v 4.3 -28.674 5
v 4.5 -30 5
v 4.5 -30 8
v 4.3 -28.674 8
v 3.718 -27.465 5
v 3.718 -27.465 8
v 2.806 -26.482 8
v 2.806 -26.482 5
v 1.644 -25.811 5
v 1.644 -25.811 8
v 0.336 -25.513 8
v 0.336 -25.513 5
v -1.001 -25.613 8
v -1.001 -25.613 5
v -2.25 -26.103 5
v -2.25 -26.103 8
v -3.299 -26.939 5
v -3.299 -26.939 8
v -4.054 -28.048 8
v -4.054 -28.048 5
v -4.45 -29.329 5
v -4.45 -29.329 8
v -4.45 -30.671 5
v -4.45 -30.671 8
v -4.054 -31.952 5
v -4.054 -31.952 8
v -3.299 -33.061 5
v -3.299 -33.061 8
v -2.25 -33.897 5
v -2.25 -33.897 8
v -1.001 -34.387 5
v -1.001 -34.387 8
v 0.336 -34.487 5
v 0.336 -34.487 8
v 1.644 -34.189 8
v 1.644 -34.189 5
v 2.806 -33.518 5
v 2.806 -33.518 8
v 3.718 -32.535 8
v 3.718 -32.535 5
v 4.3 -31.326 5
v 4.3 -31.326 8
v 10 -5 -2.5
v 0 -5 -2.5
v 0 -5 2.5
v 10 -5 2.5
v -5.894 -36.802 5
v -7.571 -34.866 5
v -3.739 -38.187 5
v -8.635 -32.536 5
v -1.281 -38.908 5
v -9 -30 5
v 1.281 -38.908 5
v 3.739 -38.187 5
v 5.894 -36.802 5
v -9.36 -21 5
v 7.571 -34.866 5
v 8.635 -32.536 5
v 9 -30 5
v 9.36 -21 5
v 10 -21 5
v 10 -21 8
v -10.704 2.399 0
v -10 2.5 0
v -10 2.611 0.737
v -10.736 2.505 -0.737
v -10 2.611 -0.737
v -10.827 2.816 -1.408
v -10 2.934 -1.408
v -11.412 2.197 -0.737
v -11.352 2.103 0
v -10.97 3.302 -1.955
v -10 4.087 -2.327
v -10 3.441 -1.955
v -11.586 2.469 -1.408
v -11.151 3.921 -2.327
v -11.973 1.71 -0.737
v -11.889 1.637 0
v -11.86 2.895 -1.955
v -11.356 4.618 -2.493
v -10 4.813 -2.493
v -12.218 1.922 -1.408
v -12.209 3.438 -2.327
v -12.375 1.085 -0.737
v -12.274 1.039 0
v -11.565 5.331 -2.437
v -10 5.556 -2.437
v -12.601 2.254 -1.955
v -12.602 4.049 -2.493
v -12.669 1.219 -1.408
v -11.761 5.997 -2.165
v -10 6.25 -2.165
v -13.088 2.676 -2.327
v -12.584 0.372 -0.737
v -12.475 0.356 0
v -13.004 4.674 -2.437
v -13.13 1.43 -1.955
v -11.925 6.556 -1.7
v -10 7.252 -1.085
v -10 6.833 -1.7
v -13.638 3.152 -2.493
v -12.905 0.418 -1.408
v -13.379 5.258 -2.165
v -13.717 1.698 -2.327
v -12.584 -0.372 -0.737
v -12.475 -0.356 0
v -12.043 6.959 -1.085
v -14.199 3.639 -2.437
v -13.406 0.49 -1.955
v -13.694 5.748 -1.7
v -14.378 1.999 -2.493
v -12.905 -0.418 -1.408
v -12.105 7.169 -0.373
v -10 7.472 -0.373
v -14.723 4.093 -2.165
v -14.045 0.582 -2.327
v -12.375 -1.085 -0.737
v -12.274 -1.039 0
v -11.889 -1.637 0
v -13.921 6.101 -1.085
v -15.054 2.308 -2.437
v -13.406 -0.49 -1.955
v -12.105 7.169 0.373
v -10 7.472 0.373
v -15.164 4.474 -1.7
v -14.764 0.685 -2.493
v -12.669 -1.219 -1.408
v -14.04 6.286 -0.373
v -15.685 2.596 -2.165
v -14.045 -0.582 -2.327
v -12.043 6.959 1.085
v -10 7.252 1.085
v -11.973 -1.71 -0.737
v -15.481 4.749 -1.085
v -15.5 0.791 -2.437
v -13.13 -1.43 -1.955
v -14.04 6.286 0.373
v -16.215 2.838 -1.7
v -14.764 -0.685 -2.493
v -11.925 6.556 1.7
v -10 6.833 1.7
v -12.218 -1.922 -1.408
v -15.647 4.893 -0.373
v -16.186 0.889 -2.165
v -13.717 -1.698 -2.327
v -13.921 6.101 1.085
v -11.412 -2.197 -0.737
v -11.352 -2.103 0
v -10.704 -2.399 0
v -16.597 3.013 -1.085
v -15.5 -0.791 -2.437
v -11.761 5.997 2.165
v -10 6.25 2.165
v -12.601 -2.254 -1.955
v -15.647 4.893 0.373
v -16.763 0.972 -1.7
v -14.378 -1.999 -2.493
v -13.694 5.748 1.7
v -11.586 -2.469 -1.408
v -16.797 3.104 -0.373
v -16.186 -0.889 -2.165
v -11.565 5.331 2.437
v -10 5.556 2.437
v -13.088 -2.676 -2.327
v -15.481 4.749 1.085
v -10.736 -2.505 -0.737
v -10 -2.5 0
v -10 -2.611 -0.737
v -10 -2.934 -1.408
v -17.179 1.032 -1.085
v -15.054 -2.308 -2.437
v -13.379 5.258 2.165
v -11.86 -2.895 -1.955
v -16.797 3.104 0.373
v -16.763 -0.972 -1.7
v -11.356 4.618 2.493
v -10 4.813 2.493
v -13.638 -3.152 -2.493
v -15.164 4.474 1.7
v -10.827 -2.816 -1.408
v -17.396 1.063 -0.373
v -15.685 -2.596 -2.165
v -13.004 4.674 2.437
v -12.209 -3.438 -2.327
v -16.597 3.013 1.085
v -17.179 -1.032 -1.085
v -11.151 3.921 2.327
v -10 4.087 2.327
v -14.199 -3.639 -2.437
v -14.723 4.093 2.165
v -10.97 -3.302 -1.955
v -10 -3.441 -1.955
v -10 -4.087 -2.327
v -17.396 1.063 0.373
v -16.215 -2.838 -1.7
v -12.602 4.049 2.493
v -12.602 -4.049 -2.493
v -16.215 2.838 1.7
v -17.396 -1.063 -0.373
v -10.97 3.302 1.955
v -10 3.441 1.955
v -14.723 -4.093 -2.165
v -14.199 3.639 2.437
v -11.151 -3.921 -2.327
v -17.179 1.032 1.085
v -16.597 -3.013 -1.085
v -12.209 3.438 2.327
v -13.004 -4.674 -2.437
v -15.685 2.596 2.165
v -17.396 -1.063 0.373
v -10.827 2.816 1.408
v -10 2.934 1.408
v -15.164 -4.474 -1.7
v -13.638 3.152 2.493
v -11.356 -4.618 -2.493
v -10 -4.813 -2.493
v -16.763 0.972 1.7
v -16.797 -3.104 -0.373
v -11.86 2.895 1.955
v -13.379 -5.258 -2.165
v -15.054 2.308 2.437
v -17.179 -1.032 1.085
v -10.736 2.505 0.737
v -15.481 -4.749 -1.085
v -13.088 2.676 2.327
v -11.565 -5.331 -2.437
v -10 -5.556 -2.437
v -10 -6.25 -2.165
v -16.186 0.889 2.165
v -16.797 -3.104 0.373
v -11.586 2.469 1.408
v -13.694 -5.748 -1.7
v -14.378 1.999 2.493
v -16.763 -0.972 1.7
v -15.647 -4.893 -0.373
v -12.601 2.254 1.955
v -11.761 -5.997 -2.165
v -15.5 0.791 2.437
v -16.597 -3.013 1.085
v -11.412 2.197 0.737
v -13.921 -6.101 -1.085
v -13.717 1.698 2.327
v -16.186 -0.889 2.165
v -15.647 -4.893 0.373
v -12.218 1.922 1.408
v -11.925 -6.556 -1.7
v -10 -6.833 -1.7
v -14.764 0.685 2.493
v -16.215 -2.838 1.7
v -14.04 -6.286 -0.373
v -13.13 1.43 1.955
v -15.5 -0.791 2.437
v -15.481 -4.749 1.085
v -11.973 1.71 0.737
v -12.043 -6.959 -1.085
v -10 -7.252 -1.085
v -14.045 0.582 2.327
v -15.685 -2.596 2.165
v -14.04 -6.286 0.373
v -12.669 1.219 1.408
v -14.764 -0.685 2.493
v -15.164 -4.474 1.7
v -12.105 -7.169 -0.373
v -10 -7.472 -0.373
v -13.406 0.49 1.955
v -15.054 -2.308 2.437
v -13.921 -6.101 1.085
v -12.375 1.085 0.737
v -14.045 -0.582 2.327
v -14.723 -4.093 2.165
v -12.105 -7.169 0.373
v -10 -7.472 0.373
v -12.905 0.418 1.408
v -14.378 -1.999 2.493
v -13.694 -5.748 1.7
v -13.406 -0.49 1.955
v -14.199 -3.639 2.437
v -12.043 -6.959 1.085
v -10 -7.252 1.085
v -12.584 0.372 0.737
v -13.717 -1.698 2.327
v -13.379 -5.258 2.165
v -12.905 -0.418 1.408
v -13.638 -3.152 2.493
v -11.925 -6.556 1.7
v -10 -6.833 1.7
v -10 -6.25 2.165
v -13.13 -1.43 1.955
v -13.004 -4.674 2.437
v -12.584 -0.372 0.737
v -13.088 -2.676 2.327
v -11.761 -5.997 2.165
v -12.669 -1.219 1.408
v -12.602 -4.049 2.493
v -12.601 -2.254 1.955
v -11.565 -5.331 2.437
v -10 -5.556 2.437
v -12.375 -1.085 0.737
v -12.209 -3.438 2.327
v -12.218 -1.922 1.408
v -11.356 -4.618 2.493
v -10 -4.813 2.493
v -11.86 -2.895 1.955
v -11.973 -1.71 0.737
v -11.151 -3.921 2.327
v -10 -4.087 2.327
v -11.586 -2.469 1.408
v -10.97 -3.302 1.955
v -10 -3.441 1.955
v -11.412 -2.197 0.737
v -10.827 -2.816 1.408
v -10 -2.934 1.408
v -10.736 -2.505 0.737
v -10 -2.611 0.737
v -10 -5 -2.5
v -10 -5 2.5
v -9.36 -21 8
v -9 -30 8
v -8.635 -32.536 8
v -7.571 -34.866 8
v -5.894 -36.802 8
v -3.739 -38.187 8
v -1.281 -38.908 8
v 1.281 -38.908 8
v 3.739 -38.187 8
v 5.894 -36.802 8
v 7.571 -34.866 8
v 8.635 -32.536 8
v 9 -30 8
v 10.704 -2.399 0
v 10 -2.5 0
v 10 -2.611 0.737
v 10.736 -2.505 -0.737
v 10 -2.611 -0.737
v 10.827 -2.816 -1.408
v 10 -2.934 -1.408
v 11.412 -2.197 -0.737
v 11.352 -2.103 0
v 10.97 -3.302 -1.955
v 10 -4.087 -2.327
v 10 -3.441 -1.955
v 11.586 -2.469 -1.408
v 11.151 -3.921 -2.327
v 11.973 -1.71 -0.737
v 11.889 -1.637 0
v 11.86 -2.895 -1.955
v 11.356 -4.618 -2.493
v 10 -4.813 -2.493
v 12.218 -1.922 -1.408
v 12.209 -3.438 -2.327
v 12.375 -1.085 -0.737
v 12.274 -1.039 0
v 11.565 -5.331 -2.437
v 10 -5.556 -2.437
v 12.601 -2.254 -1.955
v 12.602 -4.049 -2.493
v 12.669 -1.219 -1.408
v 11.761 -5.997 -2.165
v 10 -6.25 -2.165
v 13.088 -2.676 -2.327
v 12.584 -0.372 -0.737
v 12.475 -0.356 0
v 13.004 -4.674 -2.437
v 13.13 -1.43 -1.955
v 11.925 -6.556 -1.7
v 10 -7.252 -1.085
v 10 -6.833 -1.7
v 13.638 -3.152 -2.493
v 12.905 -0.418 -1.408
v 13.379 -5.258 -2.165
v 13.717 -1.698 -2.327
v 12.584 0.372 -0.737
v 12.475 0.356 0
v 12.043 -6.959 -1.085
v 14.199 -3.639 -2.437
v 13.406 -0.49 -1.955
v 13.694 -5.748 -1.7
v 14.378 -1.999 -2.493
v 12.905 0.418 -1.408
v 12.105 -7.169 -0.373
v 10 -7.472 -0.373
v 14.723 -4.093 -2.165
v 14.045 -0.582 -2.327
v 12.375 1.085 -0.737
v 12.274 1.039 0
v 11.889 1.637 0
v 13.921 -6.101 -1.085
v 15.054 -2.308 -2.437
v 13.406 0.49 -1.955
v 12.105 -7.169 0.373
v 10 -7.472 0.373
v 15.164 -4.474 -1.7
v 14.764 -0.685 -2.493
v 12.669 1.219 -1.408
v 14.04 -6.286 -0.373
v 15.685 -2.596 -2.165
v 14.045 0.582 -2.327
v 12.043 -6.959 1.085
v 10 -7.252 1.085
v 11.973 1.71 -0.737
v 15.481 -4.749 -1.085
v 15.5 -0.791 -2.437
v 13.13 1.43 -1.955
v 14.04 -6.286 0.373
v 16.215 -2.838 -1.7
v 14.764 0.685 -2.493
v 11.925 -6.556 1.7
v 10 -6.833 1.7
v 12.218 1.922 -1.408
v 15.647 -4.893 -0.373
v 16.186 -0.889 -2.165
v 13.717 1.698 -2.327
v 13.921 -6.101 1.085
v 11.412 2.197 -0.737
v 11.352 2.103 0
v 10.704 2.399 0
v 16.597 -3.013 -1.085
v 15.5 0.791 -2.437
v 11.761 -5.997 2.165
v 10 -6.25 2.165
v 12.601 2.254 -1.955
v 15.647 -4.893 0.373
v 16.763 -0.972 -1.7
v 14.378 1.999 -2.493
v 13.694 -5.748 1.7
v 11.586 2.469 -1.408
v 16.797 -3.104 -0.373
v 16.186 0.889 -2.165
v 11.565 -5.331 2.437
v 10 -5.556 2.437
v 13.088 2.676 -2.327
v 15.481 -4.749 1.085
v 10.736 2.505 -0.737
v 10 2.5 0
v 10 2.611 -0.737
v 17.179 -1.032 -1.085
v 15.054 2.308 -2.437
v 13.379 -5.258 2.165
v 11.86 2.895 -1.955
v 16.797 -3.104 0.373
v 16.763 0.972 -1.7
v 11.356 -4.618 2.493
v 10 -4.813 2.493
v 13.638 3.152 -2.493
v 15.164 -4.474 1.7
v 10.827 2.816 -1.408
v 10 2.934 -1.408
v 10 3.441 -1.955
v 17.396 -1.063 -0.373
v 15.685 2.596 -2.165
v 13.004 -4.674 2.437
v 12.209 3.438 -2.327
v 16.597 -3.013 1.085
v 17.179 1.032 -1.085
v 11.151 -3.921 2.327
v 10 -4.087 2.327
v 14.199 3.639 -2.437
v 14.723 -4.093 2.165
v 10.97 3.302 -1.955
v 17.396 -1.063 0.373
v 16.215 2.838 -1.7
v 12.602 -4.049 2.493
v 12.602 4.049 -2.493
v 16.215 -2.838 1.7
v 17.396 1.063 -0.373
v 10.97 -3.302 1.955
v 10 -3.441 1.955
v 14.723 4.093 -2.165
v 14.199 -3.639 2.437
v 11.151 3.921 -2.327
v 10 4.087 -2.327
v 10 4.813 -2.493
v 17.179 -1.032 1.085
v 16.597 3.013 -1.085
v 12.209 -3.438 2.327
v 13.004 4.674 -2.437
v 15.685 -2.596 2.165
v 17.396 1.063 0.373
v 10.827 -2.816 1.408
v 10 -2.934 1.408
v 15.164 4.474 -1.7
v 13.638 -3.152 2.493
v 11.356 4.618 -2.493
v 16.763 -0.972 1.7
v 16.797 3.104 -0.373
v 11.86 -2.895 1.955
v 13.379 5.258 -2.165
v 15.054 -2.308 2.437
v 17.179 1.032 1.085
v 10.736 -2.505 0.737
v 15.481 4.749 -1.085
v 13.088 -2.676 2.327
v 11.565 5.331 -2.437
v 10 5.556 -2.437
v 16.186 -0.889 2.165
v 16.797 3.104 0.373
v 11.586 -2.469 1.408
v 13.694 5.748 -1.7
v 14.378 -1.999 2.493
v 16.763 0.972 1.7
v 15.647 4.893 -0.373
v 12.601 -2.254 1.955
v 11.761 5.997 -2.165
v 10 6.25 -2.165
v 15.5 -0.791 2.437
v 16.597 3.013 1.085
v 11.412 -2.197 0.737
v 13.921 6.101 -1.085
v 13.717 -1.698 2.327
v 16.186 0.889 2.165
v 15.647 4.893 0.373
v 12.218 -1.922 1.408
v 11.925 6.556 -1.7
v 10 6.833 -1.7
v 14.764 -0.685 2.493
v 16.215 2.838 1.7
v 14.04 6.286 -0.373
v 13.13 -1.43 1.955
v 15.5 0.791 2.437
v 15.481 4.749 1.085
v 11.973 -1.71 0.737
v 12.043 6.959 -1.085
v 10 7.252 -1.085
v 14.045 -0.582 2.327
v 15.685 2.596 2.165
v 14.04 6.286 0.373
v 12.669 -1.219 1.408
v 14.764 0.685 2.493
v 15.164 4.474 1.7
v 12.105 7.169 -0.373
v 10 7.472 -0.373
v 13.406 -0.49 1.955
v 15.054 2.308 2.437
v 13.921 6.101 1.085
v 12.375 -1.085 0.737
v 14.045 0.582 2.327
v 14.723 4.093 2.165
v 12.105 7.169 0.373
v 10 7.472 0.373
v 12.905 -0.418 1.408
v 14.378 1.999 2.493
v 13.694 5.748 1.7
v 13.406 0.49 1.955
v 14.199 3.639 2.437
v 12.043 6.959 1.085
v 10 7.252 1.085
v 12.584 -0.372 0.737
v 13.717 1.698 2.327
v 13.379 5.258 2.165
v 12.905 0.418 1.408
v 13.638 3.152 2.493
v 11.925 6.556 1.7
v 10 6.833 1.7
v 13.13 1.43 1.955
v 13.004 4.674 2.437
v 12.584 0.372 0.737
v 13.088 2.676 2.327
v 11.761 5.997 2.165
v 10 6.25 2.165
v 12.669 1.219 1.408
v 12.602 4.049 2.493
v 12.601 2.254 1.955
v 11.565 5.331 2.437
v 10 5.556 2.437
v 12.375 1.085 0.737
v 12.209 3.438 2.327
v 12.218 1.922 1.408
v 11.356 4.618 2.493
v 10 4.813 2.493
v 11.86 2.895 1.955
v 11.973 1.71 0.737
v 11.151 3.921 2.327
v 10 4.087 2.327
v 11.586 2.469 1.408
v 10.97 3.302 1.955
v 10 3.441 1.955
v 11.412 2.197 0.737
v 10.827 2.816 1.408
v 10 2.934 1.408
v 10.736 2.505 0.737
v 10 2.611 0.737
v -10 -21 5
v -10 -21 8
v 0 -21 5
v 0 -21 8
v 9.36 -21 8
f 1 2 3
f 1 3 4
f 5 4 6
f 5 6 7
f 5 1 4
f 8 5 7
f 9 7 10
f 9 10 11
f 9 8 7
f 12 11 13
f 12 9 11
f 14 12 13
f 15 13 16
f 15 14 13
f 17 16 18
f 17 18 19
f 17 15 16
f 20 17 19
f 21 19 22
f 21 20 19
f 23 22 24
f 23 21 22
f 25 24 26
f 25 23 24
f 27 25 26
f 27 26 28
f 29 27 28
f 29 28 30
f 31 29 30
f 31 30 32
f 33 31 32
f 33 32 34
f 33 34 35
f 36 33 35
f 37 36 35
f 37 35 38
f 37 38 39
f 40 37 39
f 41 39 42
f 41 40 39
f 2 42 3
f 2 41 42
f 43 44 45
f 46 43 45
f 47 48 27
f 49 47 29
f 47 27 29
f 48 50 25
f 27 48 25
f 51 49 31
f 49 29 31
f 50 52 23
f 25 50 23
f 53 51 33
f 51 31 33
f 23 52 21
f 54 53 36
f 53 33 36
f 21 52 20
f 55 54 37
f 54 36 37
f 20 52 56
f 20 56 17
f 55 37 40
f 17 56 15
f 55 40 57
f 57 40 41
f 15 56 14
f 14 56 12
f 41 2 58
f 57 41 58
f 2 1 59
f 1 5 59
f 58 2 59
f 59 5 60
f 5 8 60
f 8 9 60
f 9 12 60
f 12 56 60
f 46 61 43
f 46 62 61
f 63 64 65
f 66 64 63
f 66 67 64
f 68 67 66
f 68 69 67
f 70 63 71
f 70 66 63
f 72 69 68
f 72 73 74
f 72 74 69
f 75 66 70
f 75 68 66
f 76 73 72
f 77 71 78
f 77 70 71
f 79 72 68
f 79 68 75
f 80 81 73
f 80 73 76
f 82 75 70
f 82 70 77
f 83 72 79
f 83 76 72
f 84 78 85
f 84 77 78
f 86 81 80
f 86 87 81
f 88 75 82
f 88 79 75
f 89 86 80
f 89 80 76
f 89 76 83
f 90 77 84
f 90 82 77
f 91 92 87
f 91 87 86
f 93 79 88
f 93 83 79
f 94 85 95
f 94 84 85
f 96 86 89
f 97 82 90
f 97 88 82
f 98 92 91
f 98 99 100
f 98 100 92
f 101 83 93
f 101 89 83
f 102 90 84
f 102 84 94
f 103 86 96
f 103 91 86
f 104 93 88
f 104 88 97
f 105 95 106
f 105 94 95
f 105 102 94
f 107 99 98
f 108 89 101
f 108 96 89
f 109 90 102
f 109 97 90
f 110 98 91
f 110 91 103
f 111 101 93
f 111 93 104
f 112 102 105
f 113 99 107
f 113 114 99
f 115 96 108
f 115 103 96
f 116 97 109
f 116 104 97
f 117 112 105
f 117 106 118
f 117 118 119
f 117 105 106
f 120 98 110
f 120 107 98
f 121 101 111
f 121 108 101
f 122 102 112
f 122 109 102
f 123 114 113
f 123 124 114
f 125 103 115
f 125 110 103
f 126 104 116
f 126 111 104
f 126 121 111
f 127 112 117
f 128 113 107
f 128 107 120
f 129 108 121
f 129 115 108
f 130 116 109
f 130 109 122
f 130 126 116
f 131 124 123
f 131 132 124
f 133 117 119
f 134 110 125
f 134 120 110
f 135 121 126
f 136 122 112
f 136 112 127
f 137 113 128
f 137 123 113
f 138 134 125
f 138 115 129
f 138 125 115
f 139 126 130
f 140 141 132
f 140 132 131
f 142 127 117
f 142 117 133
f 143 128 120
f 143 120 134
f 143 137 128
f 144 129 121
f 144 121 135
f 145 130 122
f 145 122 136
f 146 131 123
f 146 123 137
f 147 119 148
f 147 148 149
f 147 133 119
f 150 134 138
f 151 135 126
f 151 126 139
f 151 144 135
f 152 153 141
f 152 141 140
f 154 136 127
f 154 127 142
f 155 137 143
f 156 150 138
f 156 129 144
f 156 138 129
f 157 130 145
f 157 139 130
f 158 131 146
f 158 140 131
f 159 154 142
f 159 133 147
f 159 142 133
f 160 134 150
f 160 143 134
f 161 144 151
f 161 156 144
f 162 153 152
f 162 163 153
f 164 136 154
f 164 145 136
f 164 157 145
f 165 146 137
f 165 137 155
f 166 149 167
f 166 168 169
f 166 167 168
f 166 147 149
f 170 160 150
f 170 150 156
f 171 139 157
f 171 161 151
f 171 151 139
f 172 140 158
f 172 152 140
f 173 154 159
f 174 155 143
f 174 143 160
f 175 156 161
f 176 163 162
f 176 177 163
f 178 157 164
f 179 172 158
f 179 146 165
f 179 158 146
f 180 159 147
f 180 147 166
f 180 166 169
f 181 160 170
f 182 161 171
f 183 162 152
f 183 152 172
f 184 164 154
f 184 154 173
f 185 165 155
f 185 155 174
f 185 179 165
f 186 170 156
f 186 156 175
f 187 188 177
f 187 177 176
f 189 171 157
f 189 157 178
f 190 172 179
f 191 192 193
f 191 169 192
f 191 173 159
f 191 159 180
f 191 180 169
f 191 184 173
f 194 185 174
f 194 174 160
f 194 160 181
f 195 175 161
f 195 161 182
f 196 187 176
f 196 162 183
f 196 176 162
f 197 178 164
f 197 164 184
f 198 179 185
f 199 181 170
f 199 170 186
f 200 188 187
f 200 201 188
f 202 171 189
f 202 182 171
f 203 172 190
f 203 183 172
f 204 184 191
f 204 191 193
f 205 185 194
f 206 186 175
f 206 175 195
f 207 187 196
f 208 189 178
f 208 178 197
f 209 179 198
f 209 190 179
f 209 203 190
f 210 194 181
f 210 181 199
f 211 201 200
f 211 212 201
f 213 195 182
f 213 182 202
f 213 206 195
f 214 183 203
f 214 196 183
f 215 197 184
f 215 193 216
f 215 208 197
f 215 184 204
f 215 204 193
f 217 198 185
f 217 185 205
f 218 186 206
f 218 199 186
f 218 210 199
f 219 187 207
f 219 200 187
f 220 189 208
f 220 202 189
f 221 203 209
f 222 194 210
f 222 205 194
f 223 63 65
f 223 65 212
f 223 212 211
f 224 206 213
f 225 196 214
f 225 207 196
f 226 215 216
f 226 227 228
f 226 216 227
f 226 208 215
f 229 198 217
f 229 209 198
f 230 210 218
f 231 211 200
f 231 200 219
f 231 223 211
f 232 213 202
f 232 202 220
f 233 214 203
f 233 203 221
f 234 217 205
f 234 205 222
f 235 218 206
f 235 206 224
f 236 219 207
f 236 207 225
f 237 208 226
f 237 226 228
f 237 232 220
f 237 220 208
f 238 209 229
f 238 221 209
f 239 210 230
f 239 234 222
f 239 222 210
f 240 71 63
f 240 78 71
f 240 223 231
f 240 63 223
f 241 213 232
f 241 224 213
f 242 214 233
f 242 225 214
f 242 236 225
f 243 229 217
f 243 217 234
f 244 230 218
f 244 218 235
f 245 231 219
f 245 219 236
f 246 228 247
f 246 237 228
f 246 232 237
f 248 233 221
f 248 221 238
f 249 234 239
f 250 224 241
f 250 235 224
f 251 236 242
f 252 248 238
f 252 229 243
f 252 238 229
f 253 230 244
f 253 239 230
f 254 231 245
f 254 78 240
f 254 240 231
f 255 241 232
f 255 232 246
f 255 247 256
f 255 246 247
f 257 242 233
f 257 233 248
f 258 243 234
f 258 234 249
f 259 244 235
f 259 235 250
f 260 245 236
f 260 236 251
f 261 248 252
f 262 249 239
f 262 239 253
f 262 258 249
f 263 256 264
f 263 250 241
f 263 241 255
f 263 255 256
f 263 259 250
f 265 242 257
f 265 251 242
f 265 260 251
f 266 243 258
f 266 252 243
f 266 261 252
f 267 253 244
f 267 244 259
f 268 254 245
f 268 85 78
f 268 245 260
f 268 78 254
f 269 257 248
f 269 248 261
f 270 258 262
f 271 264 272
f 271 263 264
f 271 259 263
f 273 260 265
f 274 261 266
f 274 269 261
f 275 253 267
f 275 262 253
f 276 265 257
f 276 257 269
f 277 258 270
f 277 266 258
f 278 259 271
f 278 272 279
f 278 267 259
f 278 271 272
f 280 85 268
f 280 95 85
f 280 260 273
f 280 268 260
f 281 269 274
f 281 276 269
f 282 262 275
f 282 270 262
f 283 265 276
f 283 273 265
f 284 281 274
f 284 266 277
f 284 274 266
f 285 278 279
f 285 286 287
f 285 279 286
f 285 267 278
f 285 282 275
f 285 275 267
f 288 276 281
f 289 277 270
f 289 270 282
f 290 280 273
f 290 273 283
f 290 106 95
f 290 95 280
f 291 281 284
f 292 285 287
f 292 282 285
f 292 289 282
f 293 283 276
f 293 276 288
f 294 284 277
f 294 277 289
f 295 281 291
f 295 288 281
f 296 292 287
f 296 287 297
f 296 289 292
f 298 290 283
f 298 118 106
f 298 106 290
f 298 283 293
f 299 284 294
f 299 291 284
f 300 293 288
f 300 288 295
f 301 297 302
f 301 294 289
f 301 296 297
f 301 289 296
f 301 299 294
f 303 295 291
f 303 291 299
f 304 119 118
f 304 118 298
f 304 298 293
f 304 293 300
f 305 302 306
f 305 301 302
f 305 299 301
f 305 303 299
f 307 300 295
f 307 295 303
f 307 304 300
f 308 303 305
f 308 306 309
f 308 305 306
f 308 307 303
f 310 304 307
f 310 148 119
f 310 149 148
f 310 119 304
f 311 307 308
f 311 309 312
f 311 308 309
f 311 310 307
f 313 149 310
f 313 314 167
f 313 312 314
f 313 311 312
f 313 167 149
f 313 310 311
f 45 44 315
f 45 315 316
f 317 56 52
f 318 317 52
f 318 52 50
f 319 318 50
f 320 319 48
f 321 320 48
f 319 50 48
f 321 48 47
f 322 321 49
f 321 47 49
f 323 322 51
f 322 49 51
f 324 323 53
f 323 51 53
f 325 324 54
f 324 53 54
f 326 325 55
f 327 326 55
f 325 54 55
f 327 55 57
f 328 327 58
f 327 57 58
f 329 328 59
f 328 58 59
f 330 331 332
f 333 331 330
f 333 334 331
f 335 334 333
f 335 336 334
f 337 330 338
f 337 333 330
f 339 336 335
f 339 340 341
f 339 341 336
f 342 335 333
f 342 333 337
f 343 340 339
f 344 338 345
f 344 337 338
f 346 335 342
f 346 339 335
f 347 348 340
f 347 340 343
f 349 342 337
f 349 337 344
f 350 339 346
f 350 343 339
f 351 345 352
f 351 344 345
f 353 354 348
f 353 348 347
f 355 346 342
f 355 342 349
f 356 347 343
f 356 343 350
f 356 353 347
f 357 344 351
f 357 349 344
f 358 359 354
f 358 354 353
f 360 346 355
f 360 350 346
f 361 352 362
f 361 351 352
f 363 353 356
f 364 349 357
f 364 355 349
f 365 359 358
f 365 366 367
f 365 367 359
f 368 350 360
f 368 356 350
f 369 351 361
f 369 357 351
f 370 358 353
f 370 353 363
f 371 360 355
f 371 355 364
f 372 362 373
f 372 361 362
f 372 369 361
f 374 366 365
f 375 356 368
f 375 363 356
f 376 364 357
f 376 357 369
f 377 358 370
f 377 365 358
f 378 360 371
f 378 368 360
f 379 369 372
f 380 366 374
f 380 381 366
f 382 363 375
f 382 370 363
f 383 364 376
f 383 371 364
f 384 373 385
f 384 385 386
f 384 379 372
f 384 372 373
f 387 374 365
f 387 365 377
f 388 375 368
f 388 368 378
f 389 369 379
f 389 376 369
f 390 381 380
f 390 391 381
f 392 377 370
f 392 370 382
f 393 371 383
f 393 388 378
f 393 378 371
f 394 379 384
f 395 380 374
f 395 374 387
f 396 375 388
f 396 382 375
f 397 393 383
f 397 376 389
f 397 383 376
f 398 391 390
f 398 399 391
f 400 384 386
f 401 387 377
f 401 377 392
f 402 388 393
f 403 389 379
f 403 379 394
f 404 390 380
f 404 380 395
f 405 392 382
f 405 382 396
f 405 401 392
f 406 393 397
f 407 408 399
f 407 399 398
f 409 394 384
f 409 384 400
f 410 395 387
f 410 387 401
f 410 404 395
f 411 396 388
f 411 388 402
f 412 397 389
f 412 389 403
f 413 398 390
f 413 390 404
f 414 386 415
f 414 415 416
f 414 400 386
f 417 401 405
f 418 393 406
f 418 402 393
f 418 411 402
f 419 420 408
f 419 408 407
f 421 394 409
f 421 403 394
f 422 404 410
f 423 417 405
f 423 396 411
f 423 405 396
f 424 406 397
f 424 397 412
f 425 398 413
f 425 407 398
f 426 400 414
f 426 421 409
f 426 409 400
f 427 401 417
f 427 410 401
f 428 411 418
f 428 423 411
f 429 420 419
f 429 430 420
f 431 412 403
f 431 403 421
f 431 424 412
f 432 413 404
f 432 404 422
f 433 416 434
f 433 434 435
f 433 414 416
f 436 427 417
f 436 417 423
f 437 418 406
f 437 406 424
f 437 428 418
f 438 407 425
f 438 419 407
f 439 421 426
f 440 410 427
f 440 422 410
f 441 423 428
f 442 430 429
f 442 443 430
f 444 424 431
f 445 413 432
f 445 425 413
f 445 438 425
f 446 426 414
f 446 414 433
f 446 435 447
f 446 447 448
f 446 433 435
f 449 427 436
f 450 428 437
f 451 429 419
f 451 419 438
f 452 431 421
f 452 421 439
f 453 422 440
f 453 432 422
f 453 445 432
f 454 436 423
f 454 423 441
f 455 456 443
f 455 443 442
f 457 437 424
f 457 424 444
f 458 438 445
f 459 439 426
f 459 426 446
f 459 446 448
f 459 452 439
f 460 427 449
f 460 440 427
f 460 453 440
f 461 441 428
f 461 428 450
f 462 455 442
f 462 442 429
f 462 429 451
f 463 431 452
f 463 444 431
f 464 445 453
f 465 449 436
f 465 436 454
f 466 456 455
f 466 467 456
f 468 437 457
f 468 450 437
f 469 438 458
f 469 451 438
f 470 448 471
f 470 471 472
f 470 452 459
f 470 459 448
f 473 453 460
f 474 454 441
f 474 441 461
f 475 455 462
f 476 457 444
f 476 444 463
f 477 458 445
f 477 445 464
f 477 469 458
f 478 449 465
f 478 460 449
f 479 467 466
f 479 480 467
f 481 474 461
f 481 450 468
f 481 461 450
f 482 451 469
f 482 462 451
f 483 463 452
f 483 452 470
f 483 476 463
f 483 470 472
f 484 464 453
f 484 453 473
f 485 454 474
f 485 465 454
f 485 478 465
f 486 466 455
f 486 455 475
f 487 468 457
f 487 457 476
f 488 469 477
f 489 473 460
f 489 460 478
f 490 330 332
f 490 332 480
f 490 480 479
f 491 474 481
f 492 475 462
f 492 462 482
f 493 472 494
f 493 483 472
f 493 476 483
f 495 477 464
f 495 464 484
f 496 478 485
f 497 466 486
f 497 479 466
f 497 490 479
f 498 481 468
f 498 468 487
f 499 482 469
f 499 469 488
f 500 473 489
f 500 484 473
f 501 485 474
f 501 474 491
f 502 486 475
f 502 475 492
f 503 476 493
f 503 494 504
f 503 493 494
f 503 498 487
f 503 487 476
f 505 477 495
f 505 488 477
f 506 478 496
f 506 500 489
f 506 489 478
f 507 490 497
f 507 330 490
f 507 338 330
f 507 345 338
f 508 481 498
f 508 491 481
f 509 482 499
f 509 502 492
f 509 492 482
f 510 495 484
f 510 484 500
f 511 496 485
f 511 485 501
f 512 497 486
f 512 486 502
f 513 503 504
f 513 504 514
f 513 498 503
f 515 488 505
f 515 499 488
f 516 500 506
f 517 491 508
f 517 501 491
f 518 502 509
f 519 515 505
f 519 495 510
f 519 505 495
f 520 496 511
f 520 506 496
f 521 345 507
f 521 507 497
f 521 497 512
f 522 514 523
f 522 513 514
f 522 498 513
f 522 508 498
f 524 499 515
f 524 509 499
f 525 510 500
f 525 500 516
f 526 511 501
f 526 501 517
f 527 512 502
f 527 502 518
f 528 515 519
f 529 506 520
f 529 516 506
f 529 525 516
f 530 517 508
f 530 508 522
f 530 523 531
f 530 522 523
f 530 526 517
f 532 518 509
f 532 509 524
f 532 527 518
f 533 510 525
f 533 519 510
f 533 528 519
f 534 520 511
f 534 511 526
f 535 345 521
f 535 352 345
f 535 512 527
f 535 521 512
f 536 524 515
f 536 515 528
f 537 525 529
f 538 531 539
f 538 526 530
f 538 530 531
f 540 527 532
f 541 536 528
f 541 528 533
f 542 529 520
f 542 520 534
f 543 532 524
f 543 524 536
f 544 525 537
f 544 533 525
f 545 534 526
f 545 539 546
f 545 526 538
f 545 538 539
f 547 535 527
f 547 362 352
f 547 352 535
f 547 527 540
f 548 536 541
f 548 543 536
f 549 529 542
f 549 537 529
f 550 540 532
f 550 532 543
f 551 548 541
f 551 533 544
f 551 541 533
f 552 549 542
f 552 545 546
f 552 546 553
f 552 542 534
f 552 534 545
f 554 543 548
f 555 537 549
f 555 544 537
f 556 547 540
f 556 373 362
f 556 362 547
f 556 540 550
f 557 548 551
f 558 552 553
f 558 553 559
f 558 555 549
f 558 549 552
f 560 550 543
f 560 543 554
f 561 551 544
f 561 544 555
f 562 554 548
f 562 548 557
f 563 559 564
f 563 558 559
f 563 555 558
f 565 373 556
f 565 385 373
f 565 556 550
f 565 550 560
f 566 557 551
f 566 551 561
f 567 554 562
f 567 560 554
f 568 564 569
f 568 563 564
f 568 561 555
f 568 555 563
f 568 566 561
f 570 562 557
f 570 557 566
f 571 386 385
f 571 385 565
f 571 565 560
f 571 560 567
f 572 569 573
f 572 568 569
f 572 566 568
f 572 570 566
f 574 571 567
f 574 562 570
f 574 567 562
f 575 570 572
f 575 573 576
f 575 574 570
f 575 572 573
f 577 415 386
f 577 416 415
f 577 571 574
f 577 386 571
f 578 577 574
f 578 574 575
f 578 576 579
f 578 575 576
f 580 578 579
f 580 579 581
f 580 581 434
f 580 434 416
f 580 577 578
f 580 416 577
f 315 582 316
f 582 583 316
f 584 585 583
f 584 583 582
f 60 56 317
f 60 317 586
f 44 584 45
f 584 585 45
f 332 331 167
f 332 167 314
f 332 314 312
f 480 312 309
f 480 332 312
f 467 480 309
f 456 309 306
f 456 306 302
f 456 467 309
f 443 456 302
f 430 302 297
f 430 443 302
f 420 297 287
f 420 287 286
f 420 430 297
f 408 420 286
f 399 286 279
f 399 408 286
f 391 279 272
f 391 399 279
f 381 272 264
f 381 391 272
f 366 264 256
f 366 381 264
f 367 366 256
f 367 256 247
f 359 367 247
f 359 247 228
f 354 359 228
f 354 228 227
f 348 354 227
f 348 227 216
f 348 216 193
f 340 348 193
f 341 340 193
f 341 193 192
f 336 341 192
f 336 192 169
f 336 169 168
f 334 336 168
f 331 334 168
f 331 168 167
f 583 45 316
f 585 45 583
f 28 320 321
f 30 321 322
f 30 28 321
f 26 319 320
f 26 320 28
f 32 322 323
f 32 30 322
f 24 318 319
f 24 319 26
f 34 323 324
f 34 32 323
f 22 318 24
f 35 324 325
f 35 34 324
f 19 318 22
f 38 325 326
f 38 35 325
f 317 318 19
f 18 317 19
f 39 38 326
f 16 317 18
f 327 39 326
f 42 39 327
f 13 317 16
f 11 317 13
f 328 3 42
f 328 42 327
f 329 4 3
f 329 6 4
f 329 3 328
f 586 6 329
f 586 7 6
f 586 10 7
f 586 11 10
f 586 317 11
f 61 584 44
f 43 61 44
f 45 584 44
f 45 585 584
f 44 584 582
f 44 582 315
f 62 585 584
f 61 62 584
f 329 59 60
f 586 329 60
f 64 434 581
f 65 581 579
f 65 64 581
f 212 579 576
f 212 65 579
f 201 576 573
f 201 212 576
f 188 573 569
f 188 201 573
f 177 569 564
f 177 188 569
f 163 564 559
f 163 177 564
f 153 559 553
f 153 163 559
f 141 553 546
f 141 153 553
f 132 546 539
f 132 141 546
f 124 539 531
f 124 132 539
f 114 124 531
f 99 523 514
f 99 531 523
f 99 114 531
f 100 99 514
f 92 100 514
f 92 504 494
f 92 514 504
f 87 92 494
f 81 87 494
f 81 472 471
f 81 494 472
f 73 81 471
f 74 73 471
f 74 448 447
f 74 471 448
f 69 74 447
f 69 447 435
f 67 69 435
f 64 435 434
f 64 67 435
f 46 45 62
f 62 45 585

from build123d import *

# Parameters (mm, degrees)
F3_R      = 9
F3_R_2    = 4.5
F4_DEPTH  = 3
F6_DEPTH  = 3
F8_DEPTH  = 3.1
F10_DEPTH = 10
F11_DEPTH = 10
F1_R      = 2.5


with BuildPart() as f4:
    # F3 (on offset) → F4 (new body)
    with BuildSketch(Plane.XY.offset(5)):
        with Locations((0, -30)):
            Circle(F3_R)
        with Locations((0, -30)):
            Circle(F3_R_2, mode=Mode.SUBTRACT)
    extrude(amount=F4_DEPTH)

    # F5 (on offset) → F6 (join)
    with BuildSketch(Plane.XY.offset(5)):
        Polygon((10, -5), (-10, -5), (-9, -30), (-1.422946, -23.646159), (9, -30), align=None)
    extrude(amount=F6_DEPTH)

    # F7 (on offset) → F8 (cut)
    with BuildSketch(Plane.XY.offset(5)):
        Polygon((-13.314119, -21), (0, -21), (13.596853, -21), (13.596853, -1.755954), (-14.464494, -1.755954), align=None)
    extrude(amount=F8_DEPTH, mode=Mode.SUBTRACT)


with BuildPart() as f10:
    # F9 (on Right) → F10 (new body)
    with BuildSketch(Plane.YZ):
        Polygon((-21, 5), (-5, -2.5), (-5, 2.5), (-21, 8), align=None)
    extrude(amount=F10_DEPTH)


with BuildPart() as f11:
    # F9 (on Right) → F11 (new body)
    with BuildSketch(Plane.YZ):
        Polygon((-21, 5), (-5, -2.5), (-5, 2.5), (-21, 8), align=None)
    extrude(amount=-F11_DEPTH)


with BuildPart() as f12:
    # F12: sweep along a path in F0
    with BuildLine(Plane.XY) as f12_path:
        Line((-10, -2.5), (10, -2.5))
        ThreePointArc((10, -2.5), (12.5, 0), (10, 2.5))
        Line((10, 2.5), (-10, 2.5))
        ThreePointArc((-10, 2.5), (-12.5, 0), (-10, -2.5))
    # F1 (on Right) → F12 (sweep)
    with BuildSketch(Plane.YZ):
        with Locations((-5, 0)):
            Circle(F1_R)
    sweep(path=f12_path.line)


solid = Compound([f4.part, f10.part, f11.part, f12.part])
